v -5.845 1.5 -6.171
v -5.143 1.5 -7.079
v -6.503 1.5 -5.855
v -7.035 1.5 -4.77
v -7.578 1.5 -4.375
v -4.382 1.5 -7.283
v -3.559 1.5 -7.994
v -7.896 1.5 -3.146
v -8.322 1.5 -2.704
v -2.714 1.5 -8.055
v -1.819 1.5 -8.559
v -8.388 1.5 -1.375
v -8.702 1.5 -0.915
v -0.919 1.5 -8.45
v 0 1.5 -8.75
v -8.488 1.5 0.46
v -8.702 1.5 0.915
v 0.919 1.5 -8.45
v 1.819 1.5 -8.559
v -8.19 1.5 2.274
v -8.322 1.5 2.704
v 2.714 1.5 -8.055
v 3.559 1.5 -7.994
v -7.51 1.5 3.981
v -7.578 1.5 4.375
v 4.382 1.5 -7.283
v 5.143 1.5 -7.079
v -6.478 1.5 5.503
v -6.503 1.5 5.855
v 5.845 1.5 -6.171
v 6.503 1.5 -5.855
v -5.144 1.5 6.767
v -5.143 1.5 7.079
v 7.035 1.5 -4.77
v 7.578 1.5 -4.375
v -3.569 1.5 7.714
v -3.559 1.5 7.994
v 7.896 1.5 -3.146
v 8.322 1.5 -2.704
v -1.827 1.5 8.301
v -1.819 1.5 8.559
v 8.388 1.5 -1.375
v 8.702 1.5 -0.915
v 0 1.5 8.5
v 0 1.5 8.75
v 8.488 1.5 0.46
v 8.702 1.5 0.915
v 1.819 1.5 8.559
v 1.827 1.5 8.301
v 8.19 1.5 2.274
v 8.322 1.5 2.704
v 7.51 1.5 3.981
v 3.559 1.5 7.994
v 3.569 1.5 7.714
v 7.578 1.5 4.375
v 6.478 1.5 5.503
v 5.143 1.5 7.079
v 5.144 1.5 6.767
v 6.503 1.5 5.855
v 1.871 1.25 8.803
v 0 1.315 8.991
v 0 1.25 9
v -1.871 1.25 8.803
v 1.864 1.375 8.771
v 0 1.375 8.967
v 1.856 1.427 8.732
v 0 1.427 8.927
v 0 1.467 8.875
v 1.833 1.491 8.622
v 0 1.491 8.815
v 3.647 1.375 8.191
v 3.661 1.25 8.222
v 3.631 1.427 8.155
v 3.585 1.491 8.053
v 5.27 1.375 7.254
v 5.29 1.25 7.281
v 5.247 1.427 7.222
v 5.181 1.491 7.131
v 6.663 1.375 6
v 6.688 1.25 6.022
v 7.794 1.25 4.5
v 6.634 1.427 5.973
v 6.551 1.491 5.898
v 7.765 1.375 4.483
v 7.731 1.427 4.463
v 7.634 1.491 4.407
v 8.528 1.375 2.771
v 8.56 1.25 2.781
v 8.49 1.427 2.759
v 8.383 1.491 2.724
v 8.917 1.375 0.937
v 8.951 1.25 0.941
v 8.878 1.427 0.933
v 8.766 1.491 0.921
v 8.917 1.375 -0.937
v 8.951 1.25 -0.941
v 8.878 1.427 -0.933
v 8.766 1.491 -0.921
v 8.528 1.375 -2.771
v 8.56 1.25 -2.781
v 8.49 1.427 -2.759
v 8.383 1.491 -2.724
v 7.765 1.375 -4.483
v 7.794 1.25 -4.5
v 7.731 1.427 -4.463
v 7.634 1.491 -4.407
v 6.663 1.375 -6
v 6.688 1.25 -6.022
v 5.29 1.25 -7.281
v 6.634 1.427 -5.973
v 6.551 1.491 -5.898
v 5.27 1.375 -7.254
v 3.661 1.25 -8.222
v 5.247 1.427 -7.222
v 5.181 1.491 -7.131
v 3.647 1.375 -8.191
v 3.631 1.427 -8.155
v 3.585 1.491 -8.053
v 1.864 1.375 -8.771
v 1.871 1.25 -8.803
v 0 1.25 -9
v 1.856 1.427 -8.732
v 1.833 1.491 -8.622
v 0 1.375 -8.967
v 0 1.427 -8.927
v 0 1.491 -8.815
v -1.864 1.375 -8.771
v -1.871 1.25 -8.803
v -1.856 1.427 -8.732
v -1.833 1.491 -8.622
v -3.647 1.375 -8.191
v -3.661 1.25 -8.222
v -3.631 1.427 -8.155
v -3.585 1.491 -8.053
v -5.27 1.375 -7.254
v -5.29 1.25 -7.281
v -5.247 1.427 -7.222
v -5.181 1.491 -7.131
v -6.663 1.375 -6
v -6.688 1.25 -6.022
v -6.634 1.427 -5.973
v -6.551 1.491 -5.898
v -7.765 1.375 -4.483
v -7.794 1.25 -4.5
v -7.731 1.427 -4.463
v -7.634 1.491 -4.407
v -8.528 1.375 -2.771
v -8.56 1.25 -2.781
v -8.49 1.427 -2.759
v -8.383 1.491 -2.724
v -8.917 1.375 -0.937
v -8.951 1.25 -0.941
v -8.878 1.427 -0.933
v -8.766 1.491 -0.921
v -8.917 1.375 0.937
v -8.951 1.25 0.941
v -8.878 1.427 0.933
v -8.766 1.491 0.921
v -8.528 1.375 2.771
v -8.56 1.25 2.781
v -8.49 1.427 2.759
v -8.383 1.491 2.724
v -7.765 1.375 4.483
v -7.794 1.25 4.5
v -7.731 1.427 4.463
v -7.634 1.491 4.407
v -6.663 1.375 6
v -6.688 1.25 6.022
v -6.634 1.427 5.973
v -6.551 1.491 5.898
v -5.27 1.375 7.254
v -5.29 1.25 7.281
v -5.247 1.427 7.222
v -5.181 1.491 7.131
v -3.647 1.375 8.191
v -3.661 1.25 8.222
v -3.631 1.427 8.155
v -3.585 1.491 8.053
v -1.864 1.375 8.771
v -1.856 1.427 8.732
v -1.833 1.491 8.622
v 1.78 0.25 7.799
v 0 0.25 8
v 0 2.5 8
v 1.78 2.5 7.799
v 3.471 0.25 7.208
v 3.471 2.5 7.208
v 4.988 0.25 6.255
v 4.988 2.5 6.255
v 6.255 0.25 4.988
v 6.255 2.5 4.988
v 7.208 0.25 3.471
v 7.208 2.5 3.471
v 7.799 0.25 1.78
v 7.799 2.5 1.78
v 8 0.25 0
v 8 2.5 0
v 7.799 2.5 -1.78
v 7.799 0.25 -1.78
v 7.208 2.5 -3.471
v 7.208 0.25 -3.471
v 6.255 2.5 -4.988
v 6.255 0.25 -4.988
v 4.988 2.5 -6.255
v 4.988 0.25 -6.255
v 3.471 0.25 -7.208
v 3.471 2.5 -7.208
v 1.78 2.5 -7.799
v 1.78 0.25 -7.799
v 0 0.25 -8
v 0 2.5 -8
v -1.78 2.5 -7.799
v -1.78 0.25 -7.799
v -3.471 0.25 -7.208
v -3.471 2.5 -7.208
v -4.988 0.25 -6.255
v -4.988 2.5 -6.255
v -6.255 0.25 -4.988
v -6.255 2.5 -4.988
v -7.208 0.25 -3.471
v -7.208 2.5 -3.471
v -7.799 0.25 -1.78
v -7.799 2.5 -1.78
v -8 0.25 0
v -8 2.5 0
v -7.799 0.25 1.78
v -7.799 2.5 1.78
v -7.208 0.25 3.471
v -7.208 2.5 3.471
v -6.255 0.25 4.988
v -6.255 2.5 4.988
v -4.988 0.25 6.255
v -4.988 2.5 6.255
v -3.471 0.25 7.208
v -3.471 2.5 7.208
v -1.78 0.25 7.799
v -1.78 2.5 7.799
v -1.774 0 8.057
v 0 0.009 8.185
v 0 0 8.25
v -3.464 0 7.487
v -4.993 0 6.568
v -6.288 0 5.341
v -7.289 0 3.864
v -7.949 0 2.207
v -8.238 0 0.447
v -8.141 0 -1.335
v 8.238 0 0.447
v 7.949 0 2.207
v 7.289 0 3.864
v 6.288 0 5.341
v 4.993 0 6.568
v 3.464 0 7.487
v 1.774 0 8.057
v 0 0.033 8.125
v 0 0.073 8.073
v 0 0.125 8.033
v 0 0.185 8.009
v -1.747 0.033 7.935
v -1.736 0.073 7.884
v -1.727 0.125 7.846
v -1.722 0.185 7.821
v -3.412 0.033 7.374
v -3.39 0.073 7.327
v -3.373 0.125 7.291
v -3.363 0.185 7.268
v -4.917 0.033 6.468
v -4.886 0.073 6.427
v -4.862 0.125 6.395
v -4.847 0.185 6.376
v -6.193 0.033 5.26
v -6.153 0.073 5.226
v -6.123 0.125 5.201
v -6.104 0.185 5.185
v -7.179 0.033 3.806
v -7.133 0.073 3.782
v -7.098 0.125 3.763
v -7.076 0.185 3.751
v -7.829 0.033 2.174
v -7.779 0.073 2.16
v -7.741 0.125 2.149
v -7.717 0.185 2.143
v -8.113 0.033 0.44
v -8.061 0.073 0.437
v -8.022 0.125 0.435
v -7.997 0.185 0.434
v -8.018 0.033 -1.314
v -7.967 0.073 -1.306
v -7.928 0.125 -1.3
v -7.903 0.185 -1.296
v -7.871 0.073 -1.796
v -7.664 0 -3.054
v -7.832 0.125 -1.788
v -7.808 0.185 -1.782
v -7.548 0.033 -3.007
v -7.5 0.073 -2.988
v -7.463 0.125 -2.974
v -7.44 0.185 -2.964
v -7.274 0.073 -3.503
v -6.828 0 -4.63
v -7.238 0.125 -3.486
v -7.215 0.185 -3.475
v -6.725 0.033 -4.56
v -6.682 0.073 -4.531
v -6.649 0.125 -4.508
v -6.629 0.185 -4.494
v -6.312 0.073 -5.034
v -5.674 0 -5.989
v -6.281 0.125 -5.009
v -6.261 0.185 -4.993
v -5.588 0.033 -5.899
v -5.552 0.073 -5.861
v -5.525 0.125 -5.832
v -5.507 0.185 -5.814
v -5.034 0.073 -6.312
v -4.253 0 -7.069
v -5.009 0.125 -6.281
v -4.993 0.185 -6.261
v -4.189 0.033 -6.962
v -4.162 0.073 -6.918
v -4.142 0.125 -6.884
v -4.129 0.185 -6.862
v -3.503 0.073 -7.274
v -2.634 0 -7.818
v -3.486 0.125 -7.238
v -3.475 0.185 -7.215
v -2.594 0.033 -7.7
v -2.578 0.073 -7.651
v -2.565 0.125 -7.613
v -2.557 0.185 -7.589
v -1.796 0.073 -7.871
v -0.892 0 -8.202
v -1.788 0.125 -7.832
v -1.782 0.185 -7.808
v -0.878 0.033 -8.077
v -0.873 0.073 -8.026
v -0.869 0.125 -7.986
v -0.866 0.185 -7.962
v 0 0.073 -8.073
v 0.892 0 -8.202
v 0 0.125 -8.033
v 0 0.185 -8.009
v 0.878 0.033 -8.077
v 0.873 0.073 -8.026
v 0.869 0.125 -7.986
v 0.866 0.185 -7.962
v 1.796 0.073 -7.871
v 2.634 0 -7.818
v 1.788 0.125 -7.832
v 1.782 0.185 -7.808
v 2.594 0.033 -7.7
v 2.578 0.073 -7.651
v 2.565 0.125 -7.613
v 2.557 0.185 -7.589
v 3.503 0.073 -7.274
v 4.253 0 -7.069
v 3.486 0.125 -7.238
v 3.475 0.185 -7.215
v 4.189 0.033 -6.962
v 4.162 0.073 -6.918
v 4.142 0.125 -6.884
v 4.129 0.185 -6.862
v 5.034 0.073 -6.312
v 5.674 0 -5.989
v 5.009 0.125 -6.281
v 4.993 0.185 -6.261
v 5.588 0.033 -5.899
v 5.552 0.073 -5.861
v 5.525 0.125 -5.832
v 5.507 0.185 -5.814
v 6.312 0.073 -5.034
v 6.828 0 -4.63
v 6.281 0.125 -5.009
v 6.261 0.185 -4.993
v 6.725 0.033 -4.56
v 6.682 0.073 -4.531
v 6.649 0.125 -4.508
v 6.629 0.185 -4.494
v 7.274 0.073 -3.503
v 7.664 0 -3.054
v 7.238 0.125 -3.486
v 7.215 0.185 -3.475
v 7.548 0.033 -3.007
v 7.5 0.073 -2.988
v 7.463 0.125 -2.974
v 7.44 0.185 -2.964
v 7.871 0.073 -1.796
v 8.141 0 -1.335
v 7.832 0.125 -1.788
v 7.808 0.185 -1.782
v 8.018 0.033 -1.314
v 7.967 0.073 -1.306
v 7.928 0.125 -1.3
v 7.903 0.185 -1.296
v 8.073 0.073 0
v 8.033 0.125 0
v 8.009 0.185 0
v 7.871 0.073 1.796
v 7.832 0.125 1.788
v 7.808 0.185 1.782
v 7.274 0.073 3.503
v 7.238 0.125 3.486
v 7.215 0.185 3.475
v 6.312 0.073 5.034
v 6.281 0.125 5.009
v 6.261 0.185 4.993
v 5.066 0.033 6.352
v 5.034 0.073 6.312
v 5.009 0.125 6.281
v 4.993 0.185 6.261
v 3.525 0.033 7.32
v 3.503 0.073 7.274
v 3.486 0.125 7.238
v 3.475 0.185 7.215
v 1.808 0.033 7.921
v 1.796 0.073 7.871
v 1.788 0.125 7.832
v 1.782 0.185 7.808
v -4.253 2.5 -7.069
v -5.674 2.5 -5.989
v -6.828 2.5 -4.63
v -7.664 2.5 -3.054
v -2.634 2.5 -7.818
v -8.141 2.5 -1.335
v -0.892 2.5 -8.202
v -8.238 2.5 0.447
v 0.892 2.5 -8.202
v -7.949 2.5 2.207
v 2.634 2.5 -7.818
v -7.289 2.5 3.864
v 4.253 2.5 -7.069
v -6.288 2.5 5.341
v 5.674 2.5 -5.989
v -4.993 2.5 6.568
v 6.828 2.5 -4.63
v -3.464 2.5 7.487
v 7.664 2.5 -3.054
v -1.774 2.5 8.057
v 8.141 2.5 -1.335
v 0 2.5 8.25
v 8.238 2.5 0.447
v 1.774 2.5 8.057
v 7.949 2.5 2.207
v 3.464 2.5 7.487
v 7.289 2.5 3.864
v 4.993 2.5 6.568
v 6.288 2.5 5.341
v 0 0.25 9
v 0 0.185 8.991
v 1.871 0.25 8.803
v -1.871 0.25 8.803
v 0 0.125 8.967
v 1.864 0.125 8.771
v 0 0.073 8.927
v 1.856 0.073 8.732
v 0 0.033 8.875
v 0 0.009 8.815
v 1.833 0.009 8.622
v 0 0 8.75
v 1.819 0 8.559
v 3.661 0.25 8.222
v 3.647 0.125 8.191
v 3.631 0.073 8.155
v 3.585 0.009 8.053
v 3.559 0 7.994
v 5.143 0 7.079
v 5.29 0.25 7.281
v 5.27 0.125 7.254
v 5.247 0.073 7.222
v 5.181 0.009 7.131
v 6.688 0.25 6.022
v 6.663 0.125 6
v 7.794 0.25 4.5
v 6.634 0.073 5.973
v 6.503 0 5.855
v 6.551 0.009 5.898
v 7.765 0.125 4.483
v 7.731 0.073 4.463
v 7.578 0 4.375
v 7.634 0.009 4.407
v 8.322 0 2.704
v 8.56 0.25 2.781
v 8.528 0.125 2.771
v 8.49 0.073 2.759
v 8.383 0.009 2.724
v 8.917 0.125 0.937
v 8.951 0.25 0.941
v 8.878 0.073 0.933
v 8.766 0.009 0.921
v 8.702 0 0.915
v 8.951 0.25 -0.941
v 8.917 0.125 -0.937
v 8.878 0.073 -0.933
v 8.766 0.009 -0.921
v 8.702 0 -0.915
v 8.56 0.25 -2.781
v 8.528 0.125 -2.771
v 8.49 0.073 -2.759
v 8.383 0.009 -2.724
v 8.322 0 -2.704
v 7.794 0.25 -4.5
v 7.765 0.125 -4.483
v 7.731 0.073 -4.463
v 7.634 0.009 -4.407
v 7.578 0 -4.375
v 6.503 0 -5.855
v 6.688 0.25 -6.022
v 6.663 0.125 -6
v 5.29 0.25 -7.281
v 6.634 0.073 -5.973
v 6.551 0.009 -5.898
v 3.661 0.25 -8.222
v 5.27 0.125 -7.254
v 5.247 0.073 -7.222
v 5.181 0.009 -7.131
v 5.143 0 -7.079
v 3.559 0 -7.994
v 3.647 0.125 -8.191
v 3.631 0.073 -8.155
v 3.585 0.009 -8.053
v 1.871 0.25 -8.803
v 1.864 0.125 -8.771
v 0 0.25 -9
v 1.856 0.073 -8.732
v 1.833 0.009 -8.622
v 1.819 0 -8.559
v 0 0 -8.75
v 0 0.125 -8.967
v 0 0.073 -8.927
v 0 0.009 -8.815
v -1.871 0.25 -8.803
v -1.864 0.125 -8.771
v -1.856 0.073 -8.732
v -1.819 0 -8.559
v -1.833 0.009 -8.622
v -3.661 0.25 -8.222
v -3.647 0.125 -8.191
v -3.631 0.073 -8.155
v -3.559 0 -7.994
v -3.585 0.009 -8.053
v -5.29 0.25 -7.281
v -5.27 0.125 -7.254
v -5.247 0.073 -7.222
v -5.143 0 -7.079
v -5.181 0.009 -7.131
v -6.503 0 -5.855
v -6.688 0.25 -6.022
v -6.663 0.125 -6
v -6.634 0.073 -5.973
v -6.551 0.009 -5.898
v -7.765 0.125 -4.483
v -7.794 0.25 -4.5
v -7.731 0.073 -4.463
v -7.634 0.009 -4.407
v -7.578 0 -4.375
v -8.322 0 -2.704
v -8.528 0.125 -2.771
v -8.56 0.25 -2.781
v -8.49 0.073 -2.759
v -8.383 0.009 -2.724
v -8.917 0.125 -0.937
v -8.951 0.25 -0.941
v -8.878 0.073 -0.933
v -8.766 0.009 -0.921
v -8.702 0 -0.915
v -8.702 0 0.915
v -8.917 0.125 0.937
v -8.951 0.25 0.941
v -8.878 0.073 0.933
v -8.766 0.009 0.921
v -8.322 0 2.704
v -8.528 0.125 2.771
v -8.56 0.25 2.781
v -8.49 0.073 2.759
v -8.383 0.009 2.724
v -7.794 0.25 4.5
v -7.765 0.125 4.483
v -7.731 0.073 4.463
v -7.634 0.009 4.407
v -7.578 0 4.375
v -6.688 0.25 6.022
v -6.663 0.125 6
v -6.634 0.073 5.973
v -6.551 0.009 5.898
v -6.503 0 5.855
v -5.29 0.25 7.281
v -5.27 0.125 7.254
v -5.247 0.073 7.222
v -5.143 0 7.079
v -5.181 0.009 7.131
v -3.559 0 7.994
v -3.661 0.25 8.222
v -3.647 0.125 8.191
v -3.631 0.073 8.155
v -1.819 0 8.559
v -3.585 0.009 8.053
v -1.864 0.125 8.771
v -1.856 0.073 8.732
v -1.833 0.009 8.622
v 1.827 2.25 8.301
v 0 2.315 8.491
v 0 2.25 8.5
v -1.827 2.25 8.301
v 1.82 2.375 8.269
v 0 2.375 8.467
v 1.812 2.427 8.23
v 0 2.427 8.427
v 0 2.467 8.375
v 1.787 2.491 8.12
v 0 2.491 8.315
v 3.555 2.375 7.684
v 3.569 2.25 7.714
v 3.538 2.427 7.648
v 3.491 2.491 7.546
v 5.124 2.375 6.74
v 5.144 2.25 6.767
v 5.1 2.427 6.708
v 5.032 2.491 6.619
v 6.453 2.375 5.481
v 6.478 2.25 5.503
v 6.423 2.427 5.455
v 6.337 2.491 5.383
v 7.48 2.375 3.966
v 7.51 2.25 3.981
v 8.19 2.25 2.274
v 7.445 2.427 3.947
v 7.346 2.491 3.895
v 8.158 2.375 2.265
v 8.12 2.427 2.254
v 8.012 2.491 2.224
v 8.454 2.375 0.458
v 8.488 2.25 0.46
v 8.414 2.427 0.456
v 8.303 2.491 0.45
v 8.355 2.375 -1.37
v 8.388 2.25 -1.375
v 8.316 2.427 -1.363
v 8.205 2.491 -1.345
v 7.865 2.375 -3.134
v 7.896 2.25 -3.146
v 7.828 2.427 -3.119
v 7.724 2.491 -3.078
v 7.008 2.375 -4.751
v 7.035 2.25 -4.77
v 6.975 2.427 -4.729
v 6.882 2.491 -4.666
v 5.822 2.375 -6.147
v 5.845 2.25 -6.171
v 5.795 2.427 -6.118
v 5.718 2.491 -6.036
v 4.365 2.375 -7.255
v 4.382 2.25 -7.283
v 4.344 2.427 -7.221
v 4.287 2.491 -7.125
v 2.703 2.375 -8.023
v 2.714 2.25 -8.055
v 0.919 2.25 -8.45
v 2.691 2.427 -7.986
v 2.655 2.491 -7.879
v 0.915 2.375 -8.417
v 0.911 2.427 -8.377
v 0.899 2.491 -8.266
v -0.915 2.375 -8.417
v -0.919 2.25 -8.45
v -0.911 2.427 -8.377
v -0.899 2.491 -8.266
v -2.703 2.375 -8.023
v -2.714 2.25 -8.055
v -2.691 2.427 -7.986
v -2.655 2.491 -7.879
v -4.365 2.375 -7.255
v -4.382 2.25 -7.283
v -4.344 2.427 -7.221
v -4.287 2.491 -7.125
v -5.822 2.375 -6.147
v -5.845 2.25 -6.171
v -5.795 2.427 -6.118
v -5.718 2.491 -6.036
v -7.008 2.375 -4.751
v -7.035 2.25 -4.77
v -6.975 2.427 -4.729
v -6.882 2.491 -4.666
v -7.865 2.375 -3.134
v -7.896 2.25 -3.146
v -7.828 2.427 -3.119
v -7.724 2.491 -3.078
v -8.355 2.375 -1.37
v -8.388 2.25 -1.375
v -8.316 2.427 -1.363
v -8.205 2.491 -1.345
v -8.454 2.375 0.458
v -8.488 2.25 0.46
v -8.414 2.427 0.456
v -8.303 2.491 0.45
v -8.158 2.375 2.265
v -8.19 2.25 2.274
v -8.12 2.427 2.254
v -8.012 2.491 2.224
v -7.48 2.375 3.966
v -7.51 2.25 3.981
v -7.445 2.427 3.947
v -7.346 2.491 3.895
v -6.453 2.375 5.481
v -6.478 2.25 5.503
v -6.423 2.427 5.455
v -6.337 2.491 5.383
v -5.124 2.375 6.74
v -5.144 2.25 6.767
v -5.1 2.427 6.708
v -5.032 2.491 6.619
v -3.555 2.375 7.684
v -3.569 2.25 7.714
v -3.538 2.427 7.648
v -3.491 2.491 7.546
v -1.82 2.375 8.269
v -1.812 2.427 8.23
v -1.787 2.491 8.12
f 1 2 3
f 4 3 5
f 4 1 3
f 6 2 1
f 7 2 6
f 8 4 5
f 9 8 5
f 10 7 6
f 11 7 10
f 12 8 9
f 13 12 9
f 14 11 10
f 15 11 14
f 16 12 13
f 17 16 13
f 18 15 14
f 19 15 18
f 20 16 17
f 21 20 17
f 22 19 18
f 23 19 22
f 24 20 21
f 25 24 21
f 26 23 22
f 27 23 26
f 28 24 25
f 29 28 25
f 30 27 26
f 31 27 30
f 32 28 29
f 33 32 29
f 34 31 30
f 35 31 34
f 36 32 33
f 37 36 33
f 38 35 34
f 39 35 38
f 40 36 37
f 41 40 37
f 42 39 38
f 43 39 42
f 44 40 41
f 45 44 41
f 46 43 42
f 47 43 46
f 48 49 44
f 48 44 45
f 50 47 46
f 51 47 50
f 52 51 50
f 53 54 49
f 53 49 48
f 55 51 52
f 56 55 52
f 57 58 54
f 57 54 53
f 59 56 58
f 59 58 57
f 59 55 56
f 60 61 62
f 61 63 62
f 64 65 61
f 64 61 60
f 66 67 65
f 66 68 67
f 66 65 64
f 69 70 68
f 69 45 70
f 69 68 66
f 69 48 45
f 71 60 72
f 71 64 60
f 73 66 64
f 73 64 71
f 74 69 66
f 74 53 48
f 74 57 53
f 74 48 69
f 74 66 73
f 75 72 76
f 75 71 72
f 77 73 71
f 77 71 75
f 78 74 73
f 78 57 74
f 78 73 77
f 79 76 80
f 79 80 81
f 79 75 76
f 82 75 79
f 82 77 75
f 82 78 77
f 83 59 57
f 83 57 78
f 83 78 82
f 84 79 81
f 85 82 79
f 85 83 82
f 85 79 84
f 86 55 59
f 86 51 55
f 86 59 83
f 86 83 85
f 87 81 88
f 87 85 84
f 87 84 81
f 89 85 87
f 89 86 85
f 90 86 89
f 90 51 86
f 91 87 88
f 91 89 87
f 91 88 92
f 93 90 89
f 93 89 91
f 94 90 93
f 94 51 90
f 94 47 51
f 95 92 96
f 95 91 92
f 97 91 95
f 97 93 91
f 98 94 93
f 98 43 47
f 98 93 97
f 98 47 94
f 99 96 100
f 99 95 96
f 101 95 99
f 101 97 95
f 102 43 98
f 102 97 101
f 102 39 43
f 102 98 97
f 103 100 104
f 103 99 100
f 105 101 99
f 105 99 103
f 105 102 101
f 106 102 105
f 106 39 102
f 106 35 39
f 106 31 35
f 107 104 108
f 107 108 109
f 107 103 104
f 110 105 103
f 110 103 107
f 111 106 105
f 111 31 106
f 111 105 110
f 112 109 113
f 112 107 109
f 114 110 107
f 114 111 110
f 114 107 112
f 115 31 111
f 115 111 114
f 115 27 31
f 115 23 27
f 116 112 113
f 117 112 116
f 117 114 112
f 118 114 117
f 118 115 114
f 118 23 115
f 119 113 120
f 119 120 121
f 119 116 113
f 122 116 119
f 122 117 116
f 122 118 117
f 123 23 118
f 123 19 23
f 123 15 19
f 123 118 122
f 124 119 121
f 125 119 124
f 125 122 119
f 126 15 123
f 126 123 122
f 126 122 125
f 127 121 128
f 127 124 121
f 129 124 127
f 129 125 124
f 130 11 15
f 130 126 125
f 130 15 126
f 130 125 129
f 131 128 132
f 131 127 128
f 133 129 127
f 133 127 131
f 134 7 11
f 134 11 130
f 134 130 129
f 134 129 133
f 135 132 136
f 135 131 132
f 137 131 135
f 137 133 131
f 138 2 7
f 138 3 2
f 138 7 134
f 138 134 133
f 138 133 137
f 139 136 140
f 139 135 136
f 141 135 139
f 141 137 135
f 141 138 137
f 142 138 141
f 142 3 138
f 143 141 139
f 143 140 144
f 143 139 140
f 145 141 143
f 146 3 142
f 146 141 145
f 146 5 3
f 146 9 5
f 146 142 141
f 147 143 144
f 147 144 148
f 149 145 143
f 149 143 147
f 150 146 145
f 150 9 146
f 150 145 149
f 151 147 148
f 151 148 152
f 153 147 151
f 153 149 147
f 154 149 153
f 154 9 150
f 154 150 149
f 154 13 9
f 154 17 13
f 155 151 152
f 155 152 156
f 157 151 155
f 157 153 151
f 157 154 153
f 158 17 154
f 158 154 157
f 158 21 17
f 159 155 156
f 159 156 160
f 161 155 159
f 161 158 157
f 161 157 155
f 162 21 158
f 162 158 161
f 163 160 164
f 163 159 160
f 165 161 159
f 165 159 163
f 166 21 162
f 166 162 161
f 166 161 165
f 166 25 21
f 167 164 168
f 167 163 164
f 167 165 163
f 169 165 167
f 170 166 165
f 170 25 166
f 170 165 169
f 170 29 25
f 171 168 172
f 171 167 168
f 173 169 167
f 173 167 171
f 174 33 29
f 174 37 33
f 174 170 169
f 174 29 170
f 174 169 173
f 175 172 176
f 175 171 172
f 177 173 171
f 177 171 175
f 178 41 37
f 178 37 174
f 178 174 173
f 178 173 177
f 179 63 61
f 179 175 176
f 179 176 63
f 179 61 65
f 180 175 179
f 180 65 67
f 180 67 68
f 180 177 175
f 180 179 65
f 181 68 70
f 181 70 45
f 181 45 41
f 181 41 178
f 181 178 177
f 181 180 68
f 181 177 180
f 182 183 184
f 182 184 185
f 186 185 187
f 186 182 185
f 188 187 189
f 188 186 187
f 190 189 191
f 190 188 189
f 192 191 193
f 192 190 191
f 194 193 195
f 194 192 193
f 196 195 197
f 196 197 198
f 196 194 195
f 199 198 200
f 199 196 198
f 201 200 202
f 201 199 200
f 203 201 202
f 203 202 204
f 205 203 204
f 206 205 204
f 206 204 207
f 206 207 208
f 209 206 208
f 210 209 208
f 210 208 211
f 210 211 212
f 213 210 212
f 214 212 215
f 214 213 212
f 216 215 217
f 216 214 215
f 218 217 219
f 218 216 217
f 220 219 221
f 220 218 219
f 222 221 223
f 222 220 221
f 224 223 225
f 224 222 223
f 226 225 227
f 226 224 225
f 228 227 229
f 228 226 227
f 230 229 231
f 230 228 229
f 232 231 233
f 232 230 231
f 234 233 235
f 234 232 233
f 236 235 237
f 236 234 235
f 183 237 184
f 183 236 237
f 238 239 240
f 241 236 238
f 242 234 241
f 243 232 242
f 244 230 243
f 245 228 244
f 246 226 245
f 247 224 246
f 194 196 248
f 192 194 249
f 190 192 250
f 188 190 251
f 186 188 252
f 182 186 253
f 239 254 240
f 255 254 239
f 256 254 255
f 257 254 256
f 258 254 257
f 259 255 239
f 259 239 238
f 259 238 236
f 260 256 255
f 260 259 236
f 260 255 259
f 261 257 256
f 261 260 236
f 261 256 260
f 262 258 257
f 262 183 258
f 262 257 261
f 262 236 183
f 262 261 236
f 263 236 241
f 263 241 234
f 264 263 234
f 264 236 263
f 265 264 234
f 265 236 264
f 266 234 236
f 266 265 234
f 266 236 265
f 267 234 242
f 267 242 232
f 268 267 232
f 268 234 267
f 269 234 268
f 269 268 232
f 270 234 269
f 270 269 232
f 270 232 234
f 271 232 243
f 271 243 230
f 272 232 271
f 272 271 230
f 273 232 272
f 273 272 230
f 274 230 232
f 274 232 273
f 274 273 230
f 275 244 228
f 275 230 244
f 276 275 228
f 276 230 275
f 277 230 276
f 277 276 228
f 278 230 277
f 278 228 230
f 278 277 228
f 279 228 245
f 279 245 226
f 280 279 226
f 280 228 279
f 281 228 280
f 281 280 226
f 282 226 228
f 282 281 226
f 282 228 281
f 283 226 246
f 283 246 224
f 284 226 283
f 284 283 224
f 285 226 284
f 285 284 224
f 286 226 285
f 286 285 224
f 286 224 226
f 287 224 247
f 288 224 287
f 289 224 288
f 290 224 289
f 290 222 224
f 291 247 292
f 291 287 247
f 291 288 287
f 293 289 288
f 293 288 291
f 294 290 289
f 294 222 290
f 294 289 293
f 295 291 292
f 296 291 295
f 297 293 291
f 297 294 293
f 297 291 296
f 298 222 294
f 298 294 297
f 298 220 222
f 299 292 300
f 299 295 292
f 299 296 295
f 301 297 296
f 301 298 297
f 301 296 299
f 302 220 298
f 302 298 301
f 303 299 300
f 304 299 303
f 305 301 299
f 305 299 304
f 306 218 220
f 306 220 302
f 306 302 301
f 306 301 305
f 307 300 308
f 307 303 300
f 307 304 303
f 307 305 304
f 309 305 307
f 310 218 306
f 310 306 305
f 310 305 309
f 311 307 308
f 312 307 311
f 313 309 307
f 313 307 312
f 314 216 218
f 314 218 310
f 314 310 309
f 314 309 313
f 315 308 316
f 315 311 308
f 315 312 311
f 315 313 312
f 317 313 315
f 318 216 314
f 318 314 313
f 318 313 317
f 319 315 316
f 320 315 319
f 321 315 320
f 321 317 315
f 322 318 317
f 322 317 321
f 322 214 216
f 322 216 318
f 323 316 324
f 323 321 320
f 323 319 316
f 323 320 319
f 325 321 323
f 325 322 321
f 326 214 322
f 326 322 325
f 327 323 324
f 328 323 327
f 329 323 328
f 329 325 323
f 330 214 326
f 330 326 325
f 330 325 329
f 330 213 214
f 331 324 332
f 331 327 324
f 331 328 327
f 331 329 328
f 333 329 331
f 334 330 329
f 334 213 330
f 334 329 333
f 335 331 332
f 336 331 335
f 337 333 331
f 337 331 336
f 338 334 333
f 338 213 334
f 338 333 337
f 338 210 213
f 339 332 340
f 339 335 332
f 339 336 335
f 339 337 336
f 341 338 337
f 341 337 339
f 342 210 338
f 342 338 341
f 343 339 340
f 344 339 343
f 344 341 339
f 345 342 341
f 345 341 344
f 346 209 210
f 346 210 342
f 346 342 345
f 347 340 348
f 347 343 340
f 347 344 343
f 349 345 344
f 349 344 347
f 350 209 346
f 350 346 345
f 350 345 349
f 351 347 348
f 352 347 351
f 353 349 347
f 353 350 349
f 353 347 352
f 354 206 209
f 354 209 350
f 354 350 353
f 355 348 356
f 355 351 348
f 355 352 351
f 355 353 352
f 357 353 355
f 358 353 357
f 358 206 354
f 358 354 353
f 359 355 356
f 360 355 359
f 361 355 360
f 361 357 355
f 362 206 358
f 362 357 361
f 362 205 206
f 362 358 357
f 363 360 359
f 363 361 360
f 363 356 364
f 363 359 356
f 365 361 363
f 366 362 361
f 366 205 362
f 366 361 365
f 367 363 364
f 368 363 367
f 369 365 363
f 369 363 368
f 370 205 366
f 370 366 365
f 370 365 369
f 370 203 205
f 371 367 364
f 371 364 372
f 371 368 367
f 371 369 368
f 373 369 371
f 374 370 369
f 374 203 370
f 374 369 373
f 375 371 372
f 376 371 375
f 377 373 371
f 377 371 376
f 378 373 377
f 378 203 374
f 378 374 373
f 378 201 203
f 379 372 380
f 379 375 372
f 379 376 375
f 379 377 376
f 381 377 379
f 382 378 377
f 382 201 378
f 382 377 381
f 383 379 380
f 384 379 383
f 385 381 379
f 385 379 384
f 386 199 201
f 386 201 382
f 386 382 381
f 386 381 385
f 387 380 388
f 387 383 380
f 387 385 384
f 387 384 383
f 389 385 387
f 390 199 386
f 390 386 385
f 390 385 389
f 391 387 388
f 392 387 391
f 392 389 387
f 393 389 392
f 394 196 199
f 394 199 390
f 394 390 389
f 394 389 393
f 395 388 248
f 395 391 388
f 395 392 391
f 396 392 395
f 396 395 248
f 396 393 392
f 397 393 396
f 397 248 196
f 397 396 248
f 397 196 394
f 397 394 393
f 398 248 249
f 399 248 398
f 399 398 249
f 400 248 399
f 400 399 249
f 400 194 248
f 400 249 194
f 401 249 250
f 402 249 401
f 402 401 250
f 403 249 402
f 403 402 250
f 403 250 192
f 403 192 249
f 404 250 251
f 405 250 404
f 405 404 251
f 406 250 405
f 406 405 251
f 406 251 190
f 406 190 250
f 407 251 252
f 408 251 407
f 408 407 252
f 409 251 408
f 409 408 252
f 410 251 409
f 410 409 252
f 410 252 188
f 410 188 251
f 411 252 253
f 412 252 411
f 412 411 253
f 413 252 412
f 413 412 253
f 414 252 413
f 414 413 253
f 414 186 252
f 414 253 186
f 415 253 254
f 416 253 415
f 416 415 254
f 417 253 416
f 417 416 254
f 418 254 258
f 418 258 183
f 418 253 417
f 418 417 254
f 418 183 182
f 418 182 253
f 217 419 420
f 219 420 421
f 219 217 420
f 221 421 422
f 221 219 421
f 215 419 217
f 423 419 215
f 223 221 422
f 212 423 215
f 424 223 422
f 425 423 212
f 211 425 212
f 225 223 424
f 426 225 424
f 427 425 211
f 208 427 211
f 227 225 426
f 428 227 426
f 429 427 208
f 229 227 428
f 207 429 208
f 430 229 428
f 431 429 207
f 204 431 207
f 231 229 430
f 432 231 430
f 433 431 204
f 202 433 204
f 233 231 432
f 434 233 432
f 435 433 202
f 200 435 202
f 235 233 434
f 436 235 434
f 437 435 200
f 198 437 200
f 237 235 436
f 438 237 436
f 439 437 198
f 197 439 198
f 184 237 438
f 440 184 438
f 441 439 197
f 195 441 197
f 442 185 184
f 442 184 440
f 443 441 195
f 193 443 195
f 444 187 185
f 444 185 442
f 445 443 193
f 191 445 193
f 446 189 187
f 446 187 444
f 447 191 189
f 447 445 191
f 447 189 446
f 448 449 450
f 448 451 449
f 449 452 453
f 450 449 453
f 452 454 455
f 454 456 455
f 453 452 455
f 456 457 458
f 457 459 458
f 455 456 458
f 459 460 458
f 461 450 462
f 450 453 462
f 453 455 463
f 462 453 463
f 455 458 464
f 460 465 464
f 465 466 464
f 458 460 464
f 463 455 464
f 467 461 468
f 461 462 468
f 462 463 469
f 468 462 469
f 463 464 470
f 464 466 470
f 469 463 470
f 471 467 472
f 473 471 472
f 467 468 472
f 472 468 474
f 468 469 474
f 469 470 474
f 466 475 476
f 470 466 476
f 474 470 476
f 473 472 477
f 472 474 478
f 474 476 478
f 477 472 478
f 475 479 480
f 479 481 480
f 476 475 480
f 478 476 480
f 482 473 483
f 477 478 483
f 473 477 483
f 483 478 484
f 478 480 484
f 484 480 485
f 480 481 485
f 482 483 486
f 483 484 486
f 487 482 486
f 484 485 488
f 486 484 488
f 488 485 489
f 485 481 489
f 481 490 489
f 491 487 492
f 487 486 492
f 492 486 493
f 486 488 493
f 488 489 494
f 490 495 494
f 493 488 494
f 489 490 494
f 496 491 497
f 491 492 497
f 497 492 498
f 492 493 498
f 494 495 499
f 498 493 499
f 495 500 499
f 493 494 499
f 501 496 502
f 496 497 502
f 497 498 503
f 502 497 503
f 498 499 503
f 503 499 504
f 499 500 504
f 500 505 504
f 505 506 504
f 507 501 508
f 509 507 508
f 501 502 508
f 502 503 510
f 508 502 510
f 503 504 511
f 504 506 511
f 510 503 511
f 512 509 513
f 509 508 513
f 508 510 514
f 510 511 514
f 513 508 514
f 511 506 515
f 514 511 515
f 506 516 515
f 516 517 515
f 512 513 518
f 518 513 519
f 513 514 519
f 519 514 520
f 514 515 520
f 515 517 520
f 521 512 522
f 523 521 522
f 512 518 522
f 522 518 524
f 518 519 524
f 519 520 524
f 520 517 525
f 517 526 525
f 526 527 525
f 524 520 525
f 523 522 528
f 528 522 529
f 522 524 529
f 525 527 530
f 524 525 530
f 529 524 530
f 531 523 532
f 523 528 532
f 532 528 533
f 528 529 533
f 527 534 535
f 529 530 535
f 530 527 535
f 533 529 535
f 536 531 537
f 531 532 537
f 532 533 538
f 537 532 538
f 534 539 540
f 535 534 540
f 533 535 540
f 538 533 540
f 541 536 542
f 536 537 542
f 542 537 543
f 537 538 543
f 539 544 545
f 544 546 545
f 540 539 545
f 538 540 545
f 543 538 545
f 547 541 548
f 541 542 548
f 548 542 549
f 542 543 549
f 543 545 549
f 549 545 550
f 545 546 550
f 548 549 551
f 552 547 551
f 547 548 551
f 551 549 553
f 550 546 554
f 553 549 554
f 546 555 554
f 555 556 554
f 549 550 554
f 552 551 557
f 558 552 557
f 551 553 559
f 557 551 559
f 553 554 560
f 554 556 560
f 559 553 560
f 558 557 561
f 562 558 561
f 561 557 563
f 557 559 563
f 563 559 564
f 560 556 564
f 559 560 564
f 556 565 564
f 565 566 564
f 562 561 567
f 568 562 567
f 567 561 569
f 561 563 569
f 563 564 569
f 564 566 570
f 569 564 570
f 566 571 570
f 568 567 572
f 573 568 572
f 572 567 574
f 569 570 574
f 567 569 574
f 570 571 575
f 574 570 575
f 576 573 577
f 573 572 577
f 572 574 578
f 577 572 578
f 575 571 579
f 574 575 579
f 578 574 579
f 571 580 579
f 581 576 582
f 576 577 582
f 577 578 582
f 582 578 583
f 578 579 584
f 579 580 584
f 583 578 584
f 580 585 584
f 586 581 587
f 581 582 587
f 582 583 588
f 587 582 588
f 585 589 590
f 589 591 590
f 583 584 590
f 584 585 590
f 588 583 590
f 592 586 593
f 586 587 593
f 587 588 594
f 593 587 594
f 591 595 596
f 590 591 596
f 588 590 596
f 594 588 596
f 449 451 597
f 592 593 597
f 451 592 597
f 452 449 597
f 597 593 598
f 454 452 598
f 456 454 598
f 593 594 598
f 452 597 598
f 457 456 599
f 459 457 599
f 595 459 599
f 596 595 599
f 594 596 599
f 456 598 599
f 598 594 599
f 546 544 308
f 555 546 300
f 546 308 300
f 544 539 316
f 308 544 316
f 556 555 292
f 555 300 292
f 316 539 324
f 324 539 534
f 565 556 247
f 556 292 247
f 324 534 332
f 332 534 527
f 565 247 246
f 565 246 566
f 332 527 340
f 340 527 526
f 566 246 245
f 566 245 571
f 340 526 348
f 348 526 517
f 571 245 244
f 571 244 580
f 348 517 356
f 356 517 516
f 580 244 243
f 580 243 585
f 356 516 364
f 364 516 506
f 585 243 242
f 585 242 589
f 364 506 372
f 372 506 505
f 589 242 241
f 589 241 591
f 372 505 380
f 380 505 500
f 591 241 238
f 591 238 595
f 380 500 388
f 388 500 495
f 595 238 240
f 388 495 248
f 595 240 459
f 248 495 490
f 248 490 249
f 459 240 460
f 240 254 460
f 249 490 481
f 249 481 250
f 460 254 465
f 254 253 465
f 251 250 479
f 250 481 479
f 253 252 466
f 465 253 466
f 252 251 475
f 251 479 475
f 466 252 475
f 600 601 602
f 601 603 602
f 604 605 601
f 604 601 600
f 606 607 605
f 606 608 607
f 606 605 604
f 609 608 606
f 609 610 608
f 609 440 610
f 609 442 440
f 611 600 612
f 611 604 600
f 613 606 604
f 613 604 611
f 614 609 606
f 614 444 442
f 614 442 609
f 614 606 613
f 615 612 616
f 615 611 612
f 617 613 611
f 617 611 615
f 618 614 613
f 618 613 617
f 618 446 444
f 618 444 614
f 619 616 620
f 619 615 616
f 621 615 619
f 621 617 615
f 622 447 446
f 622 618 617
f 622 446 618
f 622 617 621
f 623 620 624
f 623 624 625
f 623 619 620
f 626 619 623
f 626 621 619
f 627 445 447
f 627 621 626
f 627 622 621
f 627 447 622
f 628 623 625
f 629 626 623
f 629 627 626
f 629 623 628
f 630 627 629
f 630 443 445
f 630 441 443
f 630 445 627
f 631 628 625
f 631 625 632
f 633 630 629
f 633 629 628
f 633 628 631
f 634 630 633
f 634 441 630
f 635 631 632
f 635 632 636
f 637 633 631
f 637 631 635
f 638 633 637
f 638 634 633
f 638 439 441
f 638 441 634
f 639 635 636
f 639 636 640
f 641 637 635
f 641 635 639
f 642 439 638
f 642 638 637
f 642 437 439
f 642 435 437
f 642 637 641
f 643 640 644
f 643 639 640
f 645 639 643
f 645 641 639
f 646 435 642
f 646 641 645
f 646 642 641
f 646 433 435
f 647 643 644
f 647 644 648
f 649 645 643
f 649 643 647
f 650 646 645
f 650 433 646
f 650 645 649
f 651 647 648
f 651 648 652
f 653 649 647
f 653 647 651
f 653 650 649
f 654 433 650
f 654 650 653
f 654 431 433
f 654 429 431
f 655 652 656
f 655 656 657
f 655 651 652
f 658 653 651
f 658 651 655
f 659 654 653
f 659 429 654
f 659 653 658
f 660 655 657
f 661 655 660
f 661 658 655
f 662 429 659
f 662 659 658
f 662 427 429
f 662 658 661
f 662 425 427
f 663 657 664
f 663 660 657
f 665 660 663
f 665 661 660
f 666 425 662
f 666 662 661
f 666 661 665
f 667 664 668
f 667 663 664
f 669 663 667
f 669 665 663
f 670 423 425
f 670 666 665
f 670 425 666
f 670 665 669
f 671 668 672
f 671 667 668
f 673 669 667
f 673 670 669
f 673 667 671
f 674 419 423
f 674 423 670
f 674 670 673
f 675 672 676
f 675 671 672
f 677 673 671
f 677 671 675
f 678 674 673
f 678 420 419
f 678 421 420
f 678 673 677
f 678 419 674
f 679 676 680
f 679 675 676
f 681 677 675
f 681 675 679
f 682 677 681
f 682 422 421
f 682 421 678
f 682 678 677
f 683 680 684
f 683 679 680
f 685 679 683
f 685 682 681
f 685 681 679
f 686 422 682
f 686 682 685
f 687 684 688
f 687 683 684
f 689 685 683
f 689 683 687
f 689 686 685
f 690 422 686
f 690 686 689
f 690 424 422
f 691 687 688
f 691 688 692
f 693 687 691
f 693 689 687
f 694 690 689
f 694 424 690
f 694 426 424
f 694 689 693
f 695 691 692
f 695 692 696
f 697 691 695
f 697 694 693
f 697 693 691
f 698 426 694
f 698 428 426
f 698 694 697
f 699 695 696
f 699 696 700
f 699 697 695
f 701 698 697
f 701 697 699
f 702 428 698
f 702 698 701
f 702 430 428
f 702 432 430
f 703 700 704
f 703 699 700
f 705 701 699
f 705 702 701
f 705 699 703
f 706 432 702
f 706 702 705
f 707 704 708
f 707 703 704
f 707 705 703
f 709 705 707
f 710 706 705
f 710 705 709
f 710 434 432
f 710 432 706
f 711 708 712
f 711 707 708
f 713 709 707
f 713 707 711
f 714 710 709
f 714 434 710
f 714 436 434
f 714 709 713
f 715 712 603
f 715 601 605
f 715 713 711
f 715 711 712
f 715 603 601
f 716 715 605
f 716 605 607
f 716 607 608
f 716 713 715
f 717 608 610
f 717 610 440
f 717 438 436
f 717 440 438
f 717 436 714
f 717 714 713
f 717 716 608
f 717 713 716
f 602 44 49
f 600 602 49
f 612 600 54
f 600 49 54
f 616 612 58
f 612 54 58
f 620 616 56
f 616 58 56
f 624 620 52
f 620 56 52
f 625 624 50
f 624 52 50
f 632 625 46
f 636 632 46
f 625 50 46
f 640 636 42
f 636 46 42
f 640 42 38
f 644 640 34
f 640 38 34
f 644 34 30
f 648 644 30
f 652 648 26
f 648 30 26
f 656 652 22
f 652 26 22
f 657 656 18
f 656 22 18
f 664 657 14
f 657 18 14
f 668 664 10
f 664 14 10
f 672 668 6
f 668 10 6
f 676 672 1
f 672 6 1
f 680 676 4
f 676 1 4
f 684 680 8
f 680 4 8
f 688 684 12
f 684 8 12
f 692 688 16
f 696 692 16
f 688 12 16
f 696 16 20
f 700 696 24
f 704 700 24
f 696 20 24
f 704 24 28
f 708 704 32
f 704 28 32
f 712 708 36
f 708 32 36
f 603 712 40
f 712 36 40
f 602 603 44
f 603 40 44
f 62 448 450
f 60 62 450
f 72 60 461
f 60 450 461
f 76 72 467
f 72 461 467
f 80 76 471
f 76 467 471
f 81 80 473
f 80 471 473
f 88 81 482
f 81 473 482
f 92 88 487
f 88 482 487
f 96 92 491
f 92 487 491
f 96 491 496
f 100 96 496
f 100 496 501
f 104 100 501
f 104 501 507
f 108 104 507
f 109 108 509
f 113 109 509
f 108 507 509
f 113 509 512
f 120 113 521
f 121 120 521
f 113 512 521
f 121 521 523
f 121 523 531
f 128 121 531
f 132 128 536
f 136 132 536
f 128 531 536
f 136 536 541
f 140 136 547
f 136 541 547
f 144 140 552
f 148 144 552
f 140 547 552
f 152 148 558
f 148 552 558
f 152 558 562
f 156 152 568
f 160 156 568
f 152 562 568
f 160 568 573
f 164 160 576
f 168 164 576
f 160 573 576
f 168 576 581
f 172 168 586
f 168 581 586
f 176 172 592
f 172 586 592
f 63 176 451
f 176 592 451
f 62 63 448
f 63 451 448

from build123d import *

# Parameters (mm, degrees)
CROQUIS1_R              = 9
SALIENTE_EXTRUIR1_DEPTH = 1.5
CROQUIS2_R              = 8.5
SALIENTE_EXTRUIR2_DEPTH = 1
VACIADO1_T              = -1
CROQUIS3_R              = 8
CORTAR_EXTRUIR1_DEPTH   = 13.971121771
REDONDEO1_R             = 0.25
REDONDEO3_R             = 0.25
REDONDEO4_R             = 0.25
REDONDEO5_R             = 0.25


with BuildPart() as part:
    # Croquis1 → Saliente-Extruir1 (new body)
    with BuildSketch(Plane(origin=(0, 0, 0), x_dir=(1, 0, 0), z_dir=(0, 1, 0))):
        with Locations(Location((0, 0, 0), (0, 0, 270))):
            Circle(CROQUIS1_R)
    extrude(amount=SALIENTE_EXTRUIR1_DEPTH)

    # Croquis2 → Saliente-Extruir2 (add)
    with BuildSketch(Plane(origin=(0, 1.5, 0), x_dir=(1, 0, 0), z_dir=(0, 1, 0))):
        with Locations(Location((0, 0, 0), (0, 0, 270))):
            Circle(CROQUIS2_R)
    extrude(amount=SALIENTE_EXTRUIR2_DEPTH)

    # Vaciado1
    vaciado1_openings = [part.faces().sort_by_distance(p)[0] for p in [
        (0, 0, 0),
    ]]
    offset(amount=VACIADO1_T, openings=vaciado1_openings, kind=Kind.INTERSECTION)

    # Croquis3 → Cortar-Extruir1 (cut, through all)
    with BuildSketch(Plane(origin=(0, 2.5, 0), x_dir=(1, 0, 0), z_dir=(0, 1, 0))):
        with Locations(Location((0, 0, 0), (0, 0, 270))):
            Circle(CROQUIS3_R)
    extrude(amount=-CORTAR_EXTRUIR1_DEPTH, mode=Mode.SUBTRACT)

    # Redondeo1
    redondeo1_edges = [part.edges().sort_by_distance(p)[0] for p in [
        (0, 1.5, -9),
    ]]
    fillet(redondeo1_edges, radius=REDONDEO1_R)

    # Redondeo3
    redondeo3_edges = [part.edges().sort_by_distance(p)[0] for p in [
        (0, 2.5, -8.5),
    ]]
    fillet(redondeo3_edges, radius=REDONDEO3_R)

    # Redondeo4
    redondeo4_edges = [part.edges().sort_by_distance(p)[0] for p in [
        (0, 0, -9),
    ]]
    fillet(redondeo4_edges, radius=REDONDEO4_R)

    # Redondeo5
    redondeo5_edges = [part.edges().sort_by_distance(p)[0] for p in [
        (0, 0, -8),
    ]]
    fillet(redondeo5_edges, radius=REDONDEO5_R)


solid = part.part
